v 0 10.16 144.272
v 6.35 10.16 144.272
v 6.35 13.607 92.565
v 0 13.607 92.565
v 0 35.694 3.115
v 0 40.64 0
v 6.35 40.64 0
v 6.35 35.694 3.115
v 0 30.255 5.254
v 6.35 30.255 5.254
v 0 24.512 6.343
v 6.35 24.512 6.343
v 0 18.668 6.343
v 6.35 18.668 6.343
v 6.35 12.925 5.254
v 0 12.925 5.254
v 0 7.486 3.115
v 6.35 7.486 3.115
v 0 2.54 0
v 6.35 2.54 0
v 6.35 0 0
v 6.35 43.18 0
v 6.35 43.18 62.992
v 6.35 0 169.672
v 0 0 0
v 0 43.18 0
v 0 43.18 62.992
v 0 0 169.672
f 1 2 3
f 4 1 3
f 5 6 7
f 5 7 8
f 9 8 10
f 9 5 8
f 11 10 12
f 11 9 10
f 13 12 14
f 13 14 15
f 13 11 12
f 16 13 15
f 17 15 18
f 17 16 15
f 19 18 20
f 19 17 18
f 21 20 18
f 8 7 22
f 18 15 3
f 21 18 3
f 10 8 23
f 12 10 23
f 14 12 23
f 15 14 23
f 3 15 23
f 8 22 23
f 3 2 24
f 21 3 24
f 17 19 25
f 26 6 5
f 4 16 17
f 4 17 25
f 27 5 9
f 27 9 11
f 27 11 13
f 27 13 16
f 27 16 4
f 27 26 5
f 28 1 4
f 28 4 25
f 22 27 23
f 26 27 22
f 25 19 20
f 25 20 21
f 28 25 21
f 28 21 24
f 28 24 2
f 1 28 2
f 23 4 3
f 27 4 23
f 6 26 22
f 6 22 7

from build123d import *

# Parameters (mm, degrees)
BOSS_EXTRUDE1_DEPTH = 6.35
BOSS_EXTRUDE2_DEPTH = 6.35


with BuildPart() as part:
    # Sketch1 → Boss-Extrude1 (new body)
    with BuildSketch(Plane(origin=(0, 0, 0), x_dir=(0, 0, -1), z_dir=(1, 0, 0))):
        with BuildLine():
            Line((-106.172, 0), (-62.992, 43.18))
            Line((-62.992, 43.18), (0, 43.18))
            Line((0, 43.18), (0, 40.64))
            ThreePointArc((0, 40.64), (-6.479930943, 21.59), (0, 2.54))
            Line((0, 2.54), (0, 0))
            Line((0, 0), (-106.172, 0))
        make_face()
    extrude(amount=BOSS_EXTRUDE1_DEPTH)

    # Sketch2 → Boss-Extrude2 (add)
    with BuildSketch(Plane(origin=(6.35, 0, 0), x_dir=(0, 0, -1), z_dir=(1, 0, 0))):
        Polygon((-68.072, 0), (-169.672, 0), (-144.272, 10.16), (-68.072, 15.24), align=None)
    extrude(amount=-BOSS_EXTRUDE2_DEPTH)


solid = part.part
